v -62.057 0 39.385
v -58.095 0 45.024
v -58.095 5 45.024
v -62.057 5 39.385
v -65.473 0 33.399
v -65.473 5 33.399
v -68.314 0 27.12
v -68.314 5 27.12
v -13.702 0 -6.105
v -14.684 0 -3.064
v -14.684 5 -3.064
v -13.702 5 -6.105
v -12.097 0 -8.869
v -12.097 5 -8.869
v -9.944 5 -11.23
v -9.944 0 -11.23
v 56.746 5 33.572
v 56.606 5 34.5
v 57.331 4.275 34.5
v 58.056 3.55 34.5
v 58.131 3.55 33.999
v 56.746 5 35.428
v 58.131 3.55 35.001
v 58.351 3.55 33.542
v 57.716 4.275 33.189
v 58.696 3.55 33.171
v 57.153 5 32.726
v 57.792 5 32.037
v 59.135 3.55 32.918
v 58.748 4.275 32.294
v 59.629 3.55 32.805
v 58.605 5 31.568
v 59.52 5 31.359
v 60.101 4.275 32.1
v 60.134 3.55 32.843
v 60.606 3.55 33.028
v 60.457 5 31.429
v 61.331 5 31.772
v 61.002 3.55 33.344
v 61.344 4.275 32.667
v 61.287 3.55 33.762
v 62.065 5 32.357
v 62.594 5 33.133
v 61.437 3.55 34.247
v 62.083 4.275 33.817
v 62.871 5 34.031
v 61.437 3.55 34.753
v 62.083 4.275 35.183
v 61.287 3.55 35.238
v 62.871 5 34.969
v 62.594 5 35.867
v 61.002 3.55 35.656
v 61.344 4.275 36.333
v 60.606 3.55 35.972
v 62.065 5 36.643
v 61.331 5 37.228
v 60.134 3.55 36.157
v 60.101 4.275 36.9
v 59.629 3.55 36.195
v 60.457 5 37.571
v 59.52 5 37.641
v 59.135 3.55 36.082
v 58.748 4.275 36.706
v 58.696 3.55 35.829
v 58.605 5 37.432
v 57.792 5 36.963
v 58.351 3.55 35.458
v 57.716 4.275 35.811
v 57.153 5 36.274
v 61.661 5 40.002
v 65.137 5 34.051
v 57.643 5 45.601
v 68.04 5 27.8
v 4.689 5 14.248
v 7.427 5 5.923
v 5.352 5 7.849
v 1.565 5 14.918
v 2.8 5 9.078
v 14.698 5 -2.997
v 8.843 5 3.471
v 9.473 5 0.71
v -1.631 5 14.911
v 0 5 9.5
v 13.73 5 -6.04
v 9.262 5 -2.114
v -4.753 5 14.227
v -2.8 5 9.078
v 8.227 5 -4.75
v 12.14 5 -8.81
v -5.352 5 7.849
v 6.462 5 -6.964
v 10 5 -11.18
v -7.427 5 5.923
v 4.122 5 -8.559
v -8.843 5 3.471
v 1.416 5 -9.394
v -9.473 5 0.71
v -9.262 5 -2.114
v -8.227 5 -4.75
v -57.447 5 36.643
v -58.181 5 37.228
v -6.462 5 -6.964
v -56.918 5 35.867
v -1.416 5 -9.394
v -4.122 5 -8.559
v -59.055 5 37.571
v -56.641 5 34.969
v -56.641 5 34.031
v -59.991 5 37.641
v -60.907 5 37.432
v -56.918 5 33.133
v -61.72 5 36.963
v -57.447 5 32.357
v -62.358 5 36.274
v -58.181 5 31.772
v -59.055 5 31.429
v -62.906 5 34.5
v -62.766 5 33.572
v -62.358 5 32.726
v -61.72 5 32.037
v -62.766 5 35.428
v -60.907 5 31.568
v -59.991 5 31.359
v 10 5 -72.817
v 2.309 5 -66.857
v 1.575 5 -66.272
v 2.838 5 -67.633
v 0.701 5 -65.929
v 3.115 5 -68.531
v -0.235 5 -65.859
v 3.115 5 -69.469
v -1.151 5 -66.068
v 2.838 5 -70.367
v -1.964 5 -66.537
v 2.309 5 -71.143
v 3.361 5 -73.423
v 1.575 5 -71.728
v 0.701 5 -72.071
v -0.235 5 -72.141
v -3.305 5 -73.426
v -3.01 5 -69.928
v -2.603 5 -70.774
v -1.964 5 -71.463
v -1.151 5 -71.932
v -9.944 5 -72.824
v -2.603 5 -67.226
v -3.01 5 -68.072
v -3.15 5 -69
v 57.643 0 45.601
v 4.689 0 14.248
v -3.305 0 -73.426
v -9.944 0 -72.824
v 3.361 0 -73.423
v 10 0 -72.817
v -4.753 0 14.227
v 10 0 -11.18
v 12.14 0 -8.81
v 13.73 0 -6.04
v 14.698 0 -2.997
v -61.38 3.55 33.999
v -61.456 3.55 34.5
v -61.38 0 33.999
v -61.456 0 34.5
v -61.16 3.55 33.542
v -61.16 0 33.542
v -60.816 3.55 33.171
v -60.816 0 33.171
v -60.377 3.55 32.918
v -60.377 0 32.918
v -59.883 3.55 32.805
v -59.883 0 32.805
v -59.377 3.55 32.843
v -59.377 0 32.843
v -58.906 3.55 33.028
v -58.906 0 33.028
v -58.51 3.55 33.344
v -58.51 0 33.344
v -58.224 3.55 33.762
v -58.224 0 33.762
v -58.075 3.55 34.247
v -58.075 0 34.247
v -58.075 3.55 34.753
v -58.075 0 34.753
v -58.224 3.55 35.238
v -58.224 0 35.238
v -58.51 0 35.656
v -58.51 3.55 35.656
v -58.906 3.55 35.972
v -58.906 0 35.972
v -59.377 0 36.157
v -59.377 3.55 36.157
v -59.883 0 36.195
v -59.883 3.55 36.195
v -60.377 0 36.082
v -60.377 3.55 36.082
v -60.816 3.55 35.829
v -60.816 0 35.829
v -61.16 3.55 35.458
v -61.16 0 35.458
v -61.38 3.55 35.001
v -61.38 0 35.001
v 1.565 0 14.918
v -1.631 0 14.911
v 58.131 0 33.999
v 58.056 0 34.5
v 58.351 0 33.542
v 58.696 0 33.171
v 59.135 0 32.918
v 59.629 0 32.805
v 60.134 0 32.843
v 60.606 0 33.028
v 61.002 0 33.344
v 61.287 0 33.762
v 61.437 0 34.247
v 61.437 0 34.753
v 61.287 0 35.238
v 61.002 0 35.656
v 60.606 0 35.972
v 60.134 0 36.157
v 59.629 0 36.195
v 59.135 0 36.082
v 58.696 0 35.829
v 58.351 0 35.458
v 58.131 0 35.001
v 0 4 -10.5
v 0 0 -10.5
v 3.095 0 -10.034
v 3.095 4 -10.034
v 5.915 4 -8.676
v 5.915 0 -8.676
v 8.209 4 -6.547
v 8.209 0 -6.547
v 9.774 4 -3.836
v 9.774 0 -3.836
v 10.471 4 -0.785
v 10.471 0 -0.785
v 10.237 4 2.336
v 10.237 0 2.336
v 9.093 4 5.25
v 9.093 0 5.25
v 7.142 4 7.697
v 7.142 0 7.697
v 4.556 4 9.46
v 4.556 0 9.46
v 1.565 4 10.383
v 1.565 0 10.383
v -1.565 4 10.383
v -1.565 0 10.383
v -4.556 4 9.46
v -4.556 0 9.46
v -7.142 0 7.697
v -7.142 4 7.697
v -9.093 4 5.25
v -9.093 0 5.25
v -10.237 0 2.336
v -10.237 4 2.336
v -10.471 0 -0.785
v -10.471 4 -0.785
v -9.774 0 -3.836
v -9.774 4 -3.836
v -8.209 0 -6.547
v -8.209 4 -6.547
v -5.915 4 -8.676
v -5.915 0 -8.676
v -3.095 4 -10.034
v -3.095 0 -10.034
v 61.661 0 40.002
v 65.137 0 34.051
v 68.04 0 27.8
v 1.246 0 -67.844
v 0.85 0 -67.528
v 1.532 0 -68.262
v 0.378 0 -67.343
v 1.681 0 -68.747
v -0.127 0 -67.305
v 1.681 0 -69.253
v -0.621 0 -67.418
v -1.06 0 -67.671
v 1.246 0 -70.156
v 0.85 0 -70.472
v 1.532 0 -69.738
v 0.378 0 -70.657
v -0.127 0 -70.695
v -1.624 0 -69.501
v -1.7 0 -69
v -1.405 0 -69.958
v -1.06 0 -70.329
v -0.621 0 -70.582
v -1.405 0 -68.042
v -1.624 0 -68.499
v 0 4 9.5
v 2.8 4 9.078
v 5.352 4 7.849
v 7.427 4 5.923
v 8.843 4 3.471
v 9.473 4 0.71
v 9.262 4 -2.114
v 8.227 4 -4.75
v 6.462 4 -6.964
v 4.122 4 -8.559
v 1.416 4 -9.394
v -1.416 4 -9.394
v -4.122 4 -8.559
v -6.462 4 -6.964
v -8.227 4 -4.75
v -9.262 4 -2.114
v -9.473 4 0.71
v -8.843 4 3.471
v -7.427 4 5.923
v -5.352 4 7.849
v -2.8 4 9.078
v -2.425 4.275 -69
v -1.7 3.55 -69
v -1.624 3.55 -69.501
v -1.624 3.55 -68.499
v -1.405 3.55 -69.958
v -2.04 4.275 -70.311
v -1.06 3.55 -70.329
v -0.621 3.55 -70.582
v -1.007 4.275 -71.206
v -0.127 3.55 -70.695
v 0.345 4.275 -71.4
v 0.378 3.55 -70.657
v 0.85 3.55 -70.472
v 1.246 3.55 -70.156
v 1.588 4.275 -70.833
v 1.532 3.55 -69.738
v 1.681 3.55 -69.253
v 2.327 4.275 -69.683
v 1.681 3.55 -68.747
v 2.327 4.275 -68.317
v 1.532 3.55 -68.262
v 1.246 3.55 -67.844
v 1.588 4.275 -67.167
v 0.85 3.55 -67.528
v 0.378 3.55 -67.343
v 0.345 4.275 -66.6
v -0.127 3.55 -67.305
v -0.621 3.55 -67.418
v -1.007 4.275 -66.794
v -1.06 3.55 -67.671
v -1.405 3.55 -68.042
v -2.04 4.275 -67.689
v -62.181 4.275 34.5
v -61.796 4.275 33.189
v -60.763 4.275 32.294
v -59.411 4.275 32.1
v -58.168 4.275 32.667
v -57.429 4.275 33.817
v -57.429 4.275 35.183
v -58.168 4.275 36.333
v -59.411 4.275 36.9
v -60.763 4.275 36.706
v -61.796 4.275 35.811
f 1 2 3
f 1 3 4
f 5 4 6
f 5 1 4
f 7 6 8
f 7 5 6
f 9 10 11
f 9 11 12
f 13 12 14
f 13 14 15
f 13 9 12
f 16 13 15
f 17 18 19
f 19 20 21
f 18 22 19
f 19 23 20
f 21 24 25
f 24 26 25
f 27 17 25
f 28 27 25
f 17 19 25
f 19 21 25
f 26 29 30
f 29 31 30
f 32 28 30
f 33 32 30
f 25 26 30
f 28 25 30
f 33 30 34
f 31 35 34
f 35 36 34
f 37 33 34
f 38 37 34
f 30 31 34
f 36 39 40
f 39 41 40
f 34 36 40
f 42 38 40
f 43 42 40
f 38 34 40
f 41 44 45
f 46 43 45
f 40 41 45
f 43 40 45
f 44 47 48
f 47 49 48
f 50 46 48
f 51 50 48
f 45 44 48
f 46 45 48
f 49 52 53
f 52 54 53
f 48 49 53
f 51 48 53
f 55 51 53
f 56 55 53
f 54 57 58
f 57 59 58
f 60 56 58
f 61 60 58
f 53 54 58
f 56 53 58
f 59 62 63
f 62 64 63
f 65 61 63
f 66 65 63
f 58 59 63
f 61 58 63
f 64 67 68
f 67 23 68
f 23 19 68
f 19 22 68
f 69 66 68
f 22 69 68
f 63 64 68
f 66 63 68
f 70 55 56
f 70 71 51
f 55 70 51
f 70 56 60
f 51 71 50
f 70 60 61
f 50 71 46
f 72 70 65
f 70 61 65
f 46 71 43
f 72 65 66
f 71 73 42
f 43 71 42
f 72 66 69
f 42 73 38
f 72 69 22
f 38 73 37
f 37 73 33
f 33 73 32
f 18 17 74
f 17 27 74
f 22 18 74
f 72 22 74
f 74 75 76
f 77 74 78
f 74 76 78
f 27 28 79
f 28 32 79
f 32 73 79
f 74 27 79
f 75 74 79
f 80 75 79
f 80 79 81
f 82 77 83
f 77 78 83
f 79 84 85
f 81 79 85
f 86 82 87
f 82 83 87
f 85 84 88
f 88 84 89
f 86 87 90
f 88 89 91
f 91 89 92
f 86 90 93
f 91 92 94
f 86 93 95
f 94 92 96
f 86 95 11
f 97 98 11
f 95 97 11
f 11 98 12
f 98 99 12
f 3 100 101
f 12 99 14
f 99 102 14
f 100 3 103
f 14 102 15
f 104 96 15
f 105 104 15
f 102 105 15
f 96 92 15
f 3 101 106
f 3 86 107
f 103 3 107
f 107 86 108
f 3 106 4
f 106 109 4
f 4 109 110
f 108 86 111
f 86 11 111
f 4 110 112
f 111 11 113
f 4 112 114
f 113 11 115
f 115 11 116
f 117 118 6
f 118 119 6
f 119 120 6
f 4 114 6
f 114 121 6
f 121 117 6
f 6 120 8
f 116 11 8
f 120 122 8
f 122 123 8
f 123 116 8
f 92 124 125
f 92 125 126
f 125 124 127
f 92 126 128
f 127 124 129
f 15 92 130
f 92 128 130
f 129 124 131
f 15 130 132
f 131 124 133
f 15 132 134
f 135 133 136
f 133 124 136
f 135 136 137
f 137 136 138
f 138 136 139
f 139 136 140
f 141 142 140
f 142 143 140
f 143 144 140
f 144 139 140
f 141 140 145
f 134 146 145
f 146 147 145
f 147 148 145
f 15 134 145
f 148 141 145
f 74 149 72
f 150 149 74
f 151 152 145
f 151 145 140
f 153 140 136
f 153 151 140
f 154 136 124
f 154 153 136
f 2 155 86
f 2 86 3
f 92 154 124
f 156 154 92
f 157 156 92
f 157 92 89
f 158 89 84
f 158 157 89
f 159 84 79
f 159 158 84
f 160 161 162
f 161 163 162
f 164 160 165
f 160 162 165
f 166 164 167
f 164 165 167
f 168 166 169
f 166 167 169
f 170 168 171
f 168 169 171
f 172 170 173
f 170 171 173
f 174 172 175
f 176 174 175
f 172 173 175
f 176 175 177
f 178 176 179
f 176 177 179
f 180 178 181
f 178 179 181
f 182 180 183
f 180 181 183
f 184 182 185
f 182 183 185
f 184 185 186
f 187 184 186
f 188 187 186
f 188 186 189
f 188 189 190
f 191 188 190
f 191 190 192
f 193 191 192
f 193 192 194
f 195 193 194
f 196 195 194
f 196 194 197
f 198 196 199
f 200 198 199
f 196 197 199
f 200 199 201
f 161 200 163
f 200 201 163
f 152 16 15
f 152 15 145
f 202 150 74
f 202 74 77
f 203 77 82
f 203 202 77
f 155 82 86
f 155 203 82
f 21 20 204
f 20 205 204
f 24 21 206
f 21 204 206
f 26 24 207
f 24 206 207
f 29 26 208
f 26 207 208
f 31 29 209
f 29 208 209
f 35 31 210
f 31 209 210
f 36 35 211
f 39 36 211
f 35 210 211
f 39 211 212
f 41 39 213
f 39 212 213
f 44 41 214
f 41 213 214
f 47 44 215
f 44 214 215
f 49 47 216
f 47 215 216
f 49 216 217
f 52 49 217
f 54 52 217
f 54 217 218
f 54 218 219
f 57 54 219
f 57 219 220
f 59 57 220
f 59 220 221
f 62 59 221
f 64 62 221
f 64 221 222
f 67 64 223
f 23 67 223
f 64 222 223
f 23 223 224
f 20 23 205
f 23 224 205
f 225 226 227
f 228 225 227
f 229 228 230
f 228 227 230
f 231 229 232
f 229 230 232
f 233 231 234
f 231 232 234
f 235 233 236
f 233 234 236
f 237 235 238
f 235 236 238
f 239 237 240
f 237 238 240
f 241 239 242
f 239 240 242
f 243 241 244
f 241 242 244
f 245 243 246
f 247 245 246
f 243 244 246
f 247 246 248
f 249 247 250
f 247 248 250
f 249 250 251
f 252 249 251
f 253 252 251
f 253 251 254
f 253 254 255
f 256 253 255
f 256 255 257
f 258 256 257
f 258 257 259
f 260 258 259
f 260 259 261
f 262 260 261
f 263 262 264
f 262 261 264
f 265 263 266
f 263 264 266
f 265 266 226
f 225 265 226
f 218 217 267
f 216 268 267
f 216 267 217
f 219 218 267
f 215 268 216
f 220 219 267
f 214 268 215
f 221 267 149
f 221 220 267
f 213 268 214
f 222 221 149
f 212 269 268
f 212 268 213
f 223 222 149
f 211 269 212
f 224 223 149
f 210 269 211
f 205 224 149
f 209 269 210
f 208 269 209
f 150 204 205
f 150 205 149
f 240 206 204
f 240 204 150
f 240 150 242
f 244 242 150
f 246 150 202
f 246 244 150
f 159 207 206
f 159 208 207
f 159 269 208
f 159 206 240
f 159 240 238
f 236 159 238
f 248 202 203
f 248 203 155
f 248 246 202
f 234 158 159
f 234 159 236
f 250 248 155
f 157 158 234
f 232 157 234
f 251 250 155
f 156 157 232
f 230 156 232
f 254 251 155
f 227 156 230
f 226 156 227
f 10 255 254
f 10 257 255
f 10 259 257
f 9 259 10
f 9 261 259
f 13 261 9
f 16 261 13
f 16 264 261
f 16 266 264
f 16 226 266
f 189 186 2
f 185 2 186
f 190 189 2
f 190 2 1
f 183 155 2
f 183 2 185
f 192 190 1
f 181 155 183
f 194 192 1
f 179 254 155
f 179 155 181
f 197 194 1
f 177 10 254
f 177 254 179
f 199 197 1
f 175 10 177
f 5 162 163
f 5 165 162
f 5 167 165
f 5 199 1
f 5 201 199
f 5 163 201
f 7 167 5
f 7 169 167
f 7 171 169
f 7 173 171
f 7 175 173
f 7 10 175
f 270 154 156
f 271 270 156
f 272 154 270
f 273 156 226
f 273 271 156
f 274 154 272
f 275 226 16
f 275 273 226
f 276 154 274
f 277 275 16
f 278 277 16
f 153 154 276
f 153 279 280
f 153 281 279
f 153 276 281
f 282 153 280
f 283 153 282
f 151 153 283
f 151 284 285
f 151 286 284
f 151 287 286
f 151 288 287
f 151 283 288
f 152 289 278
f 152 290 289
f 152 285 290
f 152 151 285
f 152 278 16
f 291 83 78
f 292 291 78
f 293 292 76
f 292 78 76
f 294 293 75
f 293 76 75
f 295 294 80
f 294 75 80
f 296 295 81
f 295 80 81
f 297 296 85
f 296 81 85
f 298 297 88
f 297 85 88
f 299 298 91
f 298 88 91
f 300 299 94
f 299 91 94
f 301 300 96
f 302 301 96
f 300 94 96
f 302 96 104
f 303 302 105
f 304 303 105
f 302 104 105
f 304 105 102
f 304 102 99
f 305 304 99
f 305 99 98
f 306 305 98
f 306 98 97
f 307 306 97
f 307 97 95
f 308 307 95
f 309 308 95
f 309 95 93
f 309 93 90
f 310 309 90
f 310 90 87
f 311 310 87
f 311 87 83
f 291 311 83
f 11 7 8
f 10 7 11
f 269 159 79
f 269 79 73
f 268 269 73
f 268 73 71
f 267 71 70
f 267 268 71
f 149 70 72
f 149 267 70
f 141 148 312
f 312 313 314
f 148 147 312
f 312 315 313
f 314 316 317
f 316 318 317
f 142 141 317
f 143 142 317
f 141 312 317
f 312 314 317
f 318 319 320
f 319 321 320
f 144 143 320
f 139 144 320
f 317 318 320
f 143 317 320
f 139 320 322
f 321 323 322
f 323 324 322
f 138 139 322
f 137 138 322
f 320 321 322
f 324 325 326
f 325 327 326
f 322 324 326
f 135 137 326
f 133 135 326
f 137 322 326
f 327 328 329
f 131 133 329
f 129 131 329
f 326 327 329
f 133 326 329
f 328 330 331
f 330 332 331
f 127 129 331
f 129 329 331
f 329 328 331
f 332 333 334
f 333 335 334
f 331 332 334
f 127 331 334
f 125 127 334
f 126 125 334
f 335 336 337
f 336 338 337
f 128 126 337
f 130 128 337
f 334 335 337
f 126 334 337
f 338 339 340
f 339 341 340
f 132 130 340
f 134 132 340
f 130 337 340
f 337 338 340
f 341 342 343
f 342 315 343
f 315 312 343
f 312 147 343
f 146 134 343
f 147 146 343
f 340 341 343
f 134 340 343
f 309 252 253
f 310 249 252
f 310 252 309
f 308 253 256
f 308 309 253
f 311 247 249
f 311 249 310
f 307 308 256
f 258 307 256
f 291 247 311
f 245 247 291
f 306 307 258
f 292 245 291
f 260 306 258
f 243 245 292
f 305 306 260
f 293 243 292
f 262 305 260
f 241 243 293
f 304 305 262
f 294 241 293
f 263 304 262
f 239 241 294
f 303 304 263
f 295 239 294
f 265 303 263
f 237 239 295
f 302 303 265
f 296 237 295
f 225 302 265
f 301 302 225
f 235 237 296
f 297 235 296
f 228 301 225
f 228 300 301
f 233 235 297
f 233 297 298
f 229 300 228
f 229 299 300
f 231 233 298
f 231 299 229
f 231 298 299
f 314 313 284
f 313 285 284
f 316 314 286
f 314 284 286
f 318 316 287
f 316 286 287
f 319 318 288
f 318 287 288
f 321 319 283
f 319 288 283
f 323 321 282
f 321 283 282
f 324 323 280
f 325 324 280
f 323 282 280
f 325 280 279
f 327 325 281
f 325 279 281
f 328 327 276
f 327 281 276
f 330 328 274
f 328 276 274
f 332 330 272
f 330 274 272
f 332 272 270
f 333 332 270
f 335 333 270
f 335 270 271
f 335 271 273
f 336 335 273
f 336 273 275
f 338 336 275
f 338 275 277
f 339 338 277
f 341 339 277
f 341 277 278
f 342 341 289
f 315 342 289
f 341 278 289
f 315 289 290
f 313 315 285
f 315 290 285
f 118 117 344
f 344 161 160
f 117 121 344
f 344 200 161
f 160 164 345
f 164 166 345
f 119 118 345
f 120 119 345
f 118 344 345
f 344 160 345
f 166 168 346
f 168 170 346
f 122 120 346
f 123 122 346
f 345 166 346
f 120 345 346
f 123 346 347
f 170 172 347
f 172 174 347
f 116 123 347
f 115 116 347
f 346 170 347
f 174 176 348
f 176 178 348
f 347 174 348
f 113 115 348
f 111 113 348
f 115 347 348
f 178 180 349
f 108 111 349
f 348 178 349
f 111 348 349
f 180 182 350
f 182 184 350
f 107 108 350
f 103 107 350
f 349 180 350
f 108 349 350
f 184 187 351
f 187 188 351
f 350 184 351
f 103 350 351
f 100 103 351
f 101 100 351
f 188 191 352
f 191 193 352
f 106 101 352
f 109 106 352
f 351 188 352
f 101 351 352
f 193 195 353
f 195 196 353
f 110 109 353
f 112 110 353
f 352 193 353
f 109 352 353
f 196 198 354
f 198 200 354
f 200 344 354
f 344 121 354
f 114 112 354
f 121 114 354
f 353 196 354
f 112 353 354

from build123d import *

# Parameters (mm, degrees)
SALIENTE_EXTRUIR1_DEPTH                         = 5
CROQUIS6_R                                      = 1.6
CORTAR_EXTRUIR4_DEPTH                           = 10
CROQUIS8_R                                      = 10.5
CORTAR_EXTRUIR5_DEPTH                           = 4
CROQUIS9_R                                      = 9.5
CORTAR_EXTRUIR6_DEPTH                           = 4
CSK_FOR_M3_FLAT_HEAD_MACHINE_SCREW1_D           = 3.4
CSK_FOR_M3_FLAT_HEAD_MACHINE_SCREW1_CSINK_D     = 6.3
CSK_FOR_M3_FLAT_HEAD_MACHINE_SCREW1_CSINK_ANGLE = 90


with BuildPart() as part:
    # Croquis1 → Saliente-Extruir1 (new body)
    with BuildSketch(Plane(origin=(0, 0, 0), x_dir=(1, 0, 0), z_dir=(0, 1, 0))):
        with BuildLine():
            Line((-9.944316368, 11.229896347), (-9.944316368, 72.824175738))
            ThreePointArc((-9.944316368, 72.824175738), (0.028101663, 73.499994628), (10, 72.816550317))
            Line((10, 72.816550317), (10, 11.180339887))
            ThreePointArc((10, 11.180339887), (13.008976456, 7.467699215), (14.697533703, 2.997082424))
            Line((14.697533703, 2.997082424), (68.039744383, -27.800057271))
            ThreePointArc((68.039744383, -27.800057271), (63.468798846, -37.066987644), (57.643462165, -45.601329691))
            Line((57.643462165, -45.601329691), (4.689417529, -14.24813543))
            ThreePointArc((4.689417529, -14.24813543), (-0.033608107, -14.99996235), (-4.753217335, -14.226978772))
            Line((-4.753217335, -14.226978772), (-58.095428015, -45.024118467))
            ThreePointArc((-58.095428015, -45.024118467), (-63.835352365, -36.432098327), (-68.313641042, -27.120037751))
            Line((-68.313641042, -27.120037751), (-14.68380565, 3.06363373))
            ThreePointArc((-14.68380565, 3.06363373), (-12.973359619, 7.529405035), (-9.944316368, 11.229896347))
        make_face()
    extrude(amount=SALIENTE_EXTRUIR1_DEPTH)

    # Croquis6 → Cortar-Extruir4 (cut, symmetric)
    with BuildSketch(Plane(origin=(0, 5, 0), x_dir=(1, 0, 0), z_dir=(0, 1, 0))):
        with Locations(Location((0, 69, 0), (0, 0, 270))):
            Circle(CROQUIS6_R)
        with Locations(Location((59.755752861, -34.5, 0), (0, 0, 270))):
            Circle(CROQUIS6_R)
        with Locations(Location((-59.755752861, -34.5, 0), (0, 0, 270))):
            Circle(CROQUIS6_R)
    extrude(amount=CORTAR_EXTRUIR4_DEPTH, both=True, mode=Mode.SUBTRACT)

    # Croquis8 → Cortar-Extruir5 (cut)
    with BuildSketch(Plane.XZ):
        with Locations(Location((0, 0, 0), (0, 0, 270))):
            Circle(CROQUIS8_R)
    extrude(amount=-CORTAR_EXTRUIR5_DEPTH, mode=Mode.SUBTRACT)

    # Croquis9 → Cortar-Extruir6 (cut)
    with BuildSketch(Plane(origin=(0, 5, 0), x_dir=(1, 0, 0), z_dir=(0, 1, 0))):
        with Locations(Location((0, 0, 0), (0, 0, 270))):
            Circle(CROQUIS9_R)
    extrude(amount=-CORTAR_EXTRUIR6_DEPTH, mode=Mode.SUBTRACT)

    # CSK for M3 Flat Head Machine Screw1 (through all)
    with Locations(Plane(origin=(0, 5, 0), x_dir=(1, 0, 0), z_dir=(0, 1, 0))):
        with Locations((-59.755752861, -34.5), (0, 69), (59.755752861, -34.5)):
            CounterSinkHole(CSK_FOR_M3_FLAT_HEAD_MACHINE_SCREW1_D / 2, CSK_FOR_M3_FLAT_HEAD_MACHINE_SCREW1_CSINK_D / 2, counter_sink_angle=CSK_FOR_M3_FLAT_HEAD_MACHINE_SCREW1_CSINK_ANGLE)


solid = part.part
